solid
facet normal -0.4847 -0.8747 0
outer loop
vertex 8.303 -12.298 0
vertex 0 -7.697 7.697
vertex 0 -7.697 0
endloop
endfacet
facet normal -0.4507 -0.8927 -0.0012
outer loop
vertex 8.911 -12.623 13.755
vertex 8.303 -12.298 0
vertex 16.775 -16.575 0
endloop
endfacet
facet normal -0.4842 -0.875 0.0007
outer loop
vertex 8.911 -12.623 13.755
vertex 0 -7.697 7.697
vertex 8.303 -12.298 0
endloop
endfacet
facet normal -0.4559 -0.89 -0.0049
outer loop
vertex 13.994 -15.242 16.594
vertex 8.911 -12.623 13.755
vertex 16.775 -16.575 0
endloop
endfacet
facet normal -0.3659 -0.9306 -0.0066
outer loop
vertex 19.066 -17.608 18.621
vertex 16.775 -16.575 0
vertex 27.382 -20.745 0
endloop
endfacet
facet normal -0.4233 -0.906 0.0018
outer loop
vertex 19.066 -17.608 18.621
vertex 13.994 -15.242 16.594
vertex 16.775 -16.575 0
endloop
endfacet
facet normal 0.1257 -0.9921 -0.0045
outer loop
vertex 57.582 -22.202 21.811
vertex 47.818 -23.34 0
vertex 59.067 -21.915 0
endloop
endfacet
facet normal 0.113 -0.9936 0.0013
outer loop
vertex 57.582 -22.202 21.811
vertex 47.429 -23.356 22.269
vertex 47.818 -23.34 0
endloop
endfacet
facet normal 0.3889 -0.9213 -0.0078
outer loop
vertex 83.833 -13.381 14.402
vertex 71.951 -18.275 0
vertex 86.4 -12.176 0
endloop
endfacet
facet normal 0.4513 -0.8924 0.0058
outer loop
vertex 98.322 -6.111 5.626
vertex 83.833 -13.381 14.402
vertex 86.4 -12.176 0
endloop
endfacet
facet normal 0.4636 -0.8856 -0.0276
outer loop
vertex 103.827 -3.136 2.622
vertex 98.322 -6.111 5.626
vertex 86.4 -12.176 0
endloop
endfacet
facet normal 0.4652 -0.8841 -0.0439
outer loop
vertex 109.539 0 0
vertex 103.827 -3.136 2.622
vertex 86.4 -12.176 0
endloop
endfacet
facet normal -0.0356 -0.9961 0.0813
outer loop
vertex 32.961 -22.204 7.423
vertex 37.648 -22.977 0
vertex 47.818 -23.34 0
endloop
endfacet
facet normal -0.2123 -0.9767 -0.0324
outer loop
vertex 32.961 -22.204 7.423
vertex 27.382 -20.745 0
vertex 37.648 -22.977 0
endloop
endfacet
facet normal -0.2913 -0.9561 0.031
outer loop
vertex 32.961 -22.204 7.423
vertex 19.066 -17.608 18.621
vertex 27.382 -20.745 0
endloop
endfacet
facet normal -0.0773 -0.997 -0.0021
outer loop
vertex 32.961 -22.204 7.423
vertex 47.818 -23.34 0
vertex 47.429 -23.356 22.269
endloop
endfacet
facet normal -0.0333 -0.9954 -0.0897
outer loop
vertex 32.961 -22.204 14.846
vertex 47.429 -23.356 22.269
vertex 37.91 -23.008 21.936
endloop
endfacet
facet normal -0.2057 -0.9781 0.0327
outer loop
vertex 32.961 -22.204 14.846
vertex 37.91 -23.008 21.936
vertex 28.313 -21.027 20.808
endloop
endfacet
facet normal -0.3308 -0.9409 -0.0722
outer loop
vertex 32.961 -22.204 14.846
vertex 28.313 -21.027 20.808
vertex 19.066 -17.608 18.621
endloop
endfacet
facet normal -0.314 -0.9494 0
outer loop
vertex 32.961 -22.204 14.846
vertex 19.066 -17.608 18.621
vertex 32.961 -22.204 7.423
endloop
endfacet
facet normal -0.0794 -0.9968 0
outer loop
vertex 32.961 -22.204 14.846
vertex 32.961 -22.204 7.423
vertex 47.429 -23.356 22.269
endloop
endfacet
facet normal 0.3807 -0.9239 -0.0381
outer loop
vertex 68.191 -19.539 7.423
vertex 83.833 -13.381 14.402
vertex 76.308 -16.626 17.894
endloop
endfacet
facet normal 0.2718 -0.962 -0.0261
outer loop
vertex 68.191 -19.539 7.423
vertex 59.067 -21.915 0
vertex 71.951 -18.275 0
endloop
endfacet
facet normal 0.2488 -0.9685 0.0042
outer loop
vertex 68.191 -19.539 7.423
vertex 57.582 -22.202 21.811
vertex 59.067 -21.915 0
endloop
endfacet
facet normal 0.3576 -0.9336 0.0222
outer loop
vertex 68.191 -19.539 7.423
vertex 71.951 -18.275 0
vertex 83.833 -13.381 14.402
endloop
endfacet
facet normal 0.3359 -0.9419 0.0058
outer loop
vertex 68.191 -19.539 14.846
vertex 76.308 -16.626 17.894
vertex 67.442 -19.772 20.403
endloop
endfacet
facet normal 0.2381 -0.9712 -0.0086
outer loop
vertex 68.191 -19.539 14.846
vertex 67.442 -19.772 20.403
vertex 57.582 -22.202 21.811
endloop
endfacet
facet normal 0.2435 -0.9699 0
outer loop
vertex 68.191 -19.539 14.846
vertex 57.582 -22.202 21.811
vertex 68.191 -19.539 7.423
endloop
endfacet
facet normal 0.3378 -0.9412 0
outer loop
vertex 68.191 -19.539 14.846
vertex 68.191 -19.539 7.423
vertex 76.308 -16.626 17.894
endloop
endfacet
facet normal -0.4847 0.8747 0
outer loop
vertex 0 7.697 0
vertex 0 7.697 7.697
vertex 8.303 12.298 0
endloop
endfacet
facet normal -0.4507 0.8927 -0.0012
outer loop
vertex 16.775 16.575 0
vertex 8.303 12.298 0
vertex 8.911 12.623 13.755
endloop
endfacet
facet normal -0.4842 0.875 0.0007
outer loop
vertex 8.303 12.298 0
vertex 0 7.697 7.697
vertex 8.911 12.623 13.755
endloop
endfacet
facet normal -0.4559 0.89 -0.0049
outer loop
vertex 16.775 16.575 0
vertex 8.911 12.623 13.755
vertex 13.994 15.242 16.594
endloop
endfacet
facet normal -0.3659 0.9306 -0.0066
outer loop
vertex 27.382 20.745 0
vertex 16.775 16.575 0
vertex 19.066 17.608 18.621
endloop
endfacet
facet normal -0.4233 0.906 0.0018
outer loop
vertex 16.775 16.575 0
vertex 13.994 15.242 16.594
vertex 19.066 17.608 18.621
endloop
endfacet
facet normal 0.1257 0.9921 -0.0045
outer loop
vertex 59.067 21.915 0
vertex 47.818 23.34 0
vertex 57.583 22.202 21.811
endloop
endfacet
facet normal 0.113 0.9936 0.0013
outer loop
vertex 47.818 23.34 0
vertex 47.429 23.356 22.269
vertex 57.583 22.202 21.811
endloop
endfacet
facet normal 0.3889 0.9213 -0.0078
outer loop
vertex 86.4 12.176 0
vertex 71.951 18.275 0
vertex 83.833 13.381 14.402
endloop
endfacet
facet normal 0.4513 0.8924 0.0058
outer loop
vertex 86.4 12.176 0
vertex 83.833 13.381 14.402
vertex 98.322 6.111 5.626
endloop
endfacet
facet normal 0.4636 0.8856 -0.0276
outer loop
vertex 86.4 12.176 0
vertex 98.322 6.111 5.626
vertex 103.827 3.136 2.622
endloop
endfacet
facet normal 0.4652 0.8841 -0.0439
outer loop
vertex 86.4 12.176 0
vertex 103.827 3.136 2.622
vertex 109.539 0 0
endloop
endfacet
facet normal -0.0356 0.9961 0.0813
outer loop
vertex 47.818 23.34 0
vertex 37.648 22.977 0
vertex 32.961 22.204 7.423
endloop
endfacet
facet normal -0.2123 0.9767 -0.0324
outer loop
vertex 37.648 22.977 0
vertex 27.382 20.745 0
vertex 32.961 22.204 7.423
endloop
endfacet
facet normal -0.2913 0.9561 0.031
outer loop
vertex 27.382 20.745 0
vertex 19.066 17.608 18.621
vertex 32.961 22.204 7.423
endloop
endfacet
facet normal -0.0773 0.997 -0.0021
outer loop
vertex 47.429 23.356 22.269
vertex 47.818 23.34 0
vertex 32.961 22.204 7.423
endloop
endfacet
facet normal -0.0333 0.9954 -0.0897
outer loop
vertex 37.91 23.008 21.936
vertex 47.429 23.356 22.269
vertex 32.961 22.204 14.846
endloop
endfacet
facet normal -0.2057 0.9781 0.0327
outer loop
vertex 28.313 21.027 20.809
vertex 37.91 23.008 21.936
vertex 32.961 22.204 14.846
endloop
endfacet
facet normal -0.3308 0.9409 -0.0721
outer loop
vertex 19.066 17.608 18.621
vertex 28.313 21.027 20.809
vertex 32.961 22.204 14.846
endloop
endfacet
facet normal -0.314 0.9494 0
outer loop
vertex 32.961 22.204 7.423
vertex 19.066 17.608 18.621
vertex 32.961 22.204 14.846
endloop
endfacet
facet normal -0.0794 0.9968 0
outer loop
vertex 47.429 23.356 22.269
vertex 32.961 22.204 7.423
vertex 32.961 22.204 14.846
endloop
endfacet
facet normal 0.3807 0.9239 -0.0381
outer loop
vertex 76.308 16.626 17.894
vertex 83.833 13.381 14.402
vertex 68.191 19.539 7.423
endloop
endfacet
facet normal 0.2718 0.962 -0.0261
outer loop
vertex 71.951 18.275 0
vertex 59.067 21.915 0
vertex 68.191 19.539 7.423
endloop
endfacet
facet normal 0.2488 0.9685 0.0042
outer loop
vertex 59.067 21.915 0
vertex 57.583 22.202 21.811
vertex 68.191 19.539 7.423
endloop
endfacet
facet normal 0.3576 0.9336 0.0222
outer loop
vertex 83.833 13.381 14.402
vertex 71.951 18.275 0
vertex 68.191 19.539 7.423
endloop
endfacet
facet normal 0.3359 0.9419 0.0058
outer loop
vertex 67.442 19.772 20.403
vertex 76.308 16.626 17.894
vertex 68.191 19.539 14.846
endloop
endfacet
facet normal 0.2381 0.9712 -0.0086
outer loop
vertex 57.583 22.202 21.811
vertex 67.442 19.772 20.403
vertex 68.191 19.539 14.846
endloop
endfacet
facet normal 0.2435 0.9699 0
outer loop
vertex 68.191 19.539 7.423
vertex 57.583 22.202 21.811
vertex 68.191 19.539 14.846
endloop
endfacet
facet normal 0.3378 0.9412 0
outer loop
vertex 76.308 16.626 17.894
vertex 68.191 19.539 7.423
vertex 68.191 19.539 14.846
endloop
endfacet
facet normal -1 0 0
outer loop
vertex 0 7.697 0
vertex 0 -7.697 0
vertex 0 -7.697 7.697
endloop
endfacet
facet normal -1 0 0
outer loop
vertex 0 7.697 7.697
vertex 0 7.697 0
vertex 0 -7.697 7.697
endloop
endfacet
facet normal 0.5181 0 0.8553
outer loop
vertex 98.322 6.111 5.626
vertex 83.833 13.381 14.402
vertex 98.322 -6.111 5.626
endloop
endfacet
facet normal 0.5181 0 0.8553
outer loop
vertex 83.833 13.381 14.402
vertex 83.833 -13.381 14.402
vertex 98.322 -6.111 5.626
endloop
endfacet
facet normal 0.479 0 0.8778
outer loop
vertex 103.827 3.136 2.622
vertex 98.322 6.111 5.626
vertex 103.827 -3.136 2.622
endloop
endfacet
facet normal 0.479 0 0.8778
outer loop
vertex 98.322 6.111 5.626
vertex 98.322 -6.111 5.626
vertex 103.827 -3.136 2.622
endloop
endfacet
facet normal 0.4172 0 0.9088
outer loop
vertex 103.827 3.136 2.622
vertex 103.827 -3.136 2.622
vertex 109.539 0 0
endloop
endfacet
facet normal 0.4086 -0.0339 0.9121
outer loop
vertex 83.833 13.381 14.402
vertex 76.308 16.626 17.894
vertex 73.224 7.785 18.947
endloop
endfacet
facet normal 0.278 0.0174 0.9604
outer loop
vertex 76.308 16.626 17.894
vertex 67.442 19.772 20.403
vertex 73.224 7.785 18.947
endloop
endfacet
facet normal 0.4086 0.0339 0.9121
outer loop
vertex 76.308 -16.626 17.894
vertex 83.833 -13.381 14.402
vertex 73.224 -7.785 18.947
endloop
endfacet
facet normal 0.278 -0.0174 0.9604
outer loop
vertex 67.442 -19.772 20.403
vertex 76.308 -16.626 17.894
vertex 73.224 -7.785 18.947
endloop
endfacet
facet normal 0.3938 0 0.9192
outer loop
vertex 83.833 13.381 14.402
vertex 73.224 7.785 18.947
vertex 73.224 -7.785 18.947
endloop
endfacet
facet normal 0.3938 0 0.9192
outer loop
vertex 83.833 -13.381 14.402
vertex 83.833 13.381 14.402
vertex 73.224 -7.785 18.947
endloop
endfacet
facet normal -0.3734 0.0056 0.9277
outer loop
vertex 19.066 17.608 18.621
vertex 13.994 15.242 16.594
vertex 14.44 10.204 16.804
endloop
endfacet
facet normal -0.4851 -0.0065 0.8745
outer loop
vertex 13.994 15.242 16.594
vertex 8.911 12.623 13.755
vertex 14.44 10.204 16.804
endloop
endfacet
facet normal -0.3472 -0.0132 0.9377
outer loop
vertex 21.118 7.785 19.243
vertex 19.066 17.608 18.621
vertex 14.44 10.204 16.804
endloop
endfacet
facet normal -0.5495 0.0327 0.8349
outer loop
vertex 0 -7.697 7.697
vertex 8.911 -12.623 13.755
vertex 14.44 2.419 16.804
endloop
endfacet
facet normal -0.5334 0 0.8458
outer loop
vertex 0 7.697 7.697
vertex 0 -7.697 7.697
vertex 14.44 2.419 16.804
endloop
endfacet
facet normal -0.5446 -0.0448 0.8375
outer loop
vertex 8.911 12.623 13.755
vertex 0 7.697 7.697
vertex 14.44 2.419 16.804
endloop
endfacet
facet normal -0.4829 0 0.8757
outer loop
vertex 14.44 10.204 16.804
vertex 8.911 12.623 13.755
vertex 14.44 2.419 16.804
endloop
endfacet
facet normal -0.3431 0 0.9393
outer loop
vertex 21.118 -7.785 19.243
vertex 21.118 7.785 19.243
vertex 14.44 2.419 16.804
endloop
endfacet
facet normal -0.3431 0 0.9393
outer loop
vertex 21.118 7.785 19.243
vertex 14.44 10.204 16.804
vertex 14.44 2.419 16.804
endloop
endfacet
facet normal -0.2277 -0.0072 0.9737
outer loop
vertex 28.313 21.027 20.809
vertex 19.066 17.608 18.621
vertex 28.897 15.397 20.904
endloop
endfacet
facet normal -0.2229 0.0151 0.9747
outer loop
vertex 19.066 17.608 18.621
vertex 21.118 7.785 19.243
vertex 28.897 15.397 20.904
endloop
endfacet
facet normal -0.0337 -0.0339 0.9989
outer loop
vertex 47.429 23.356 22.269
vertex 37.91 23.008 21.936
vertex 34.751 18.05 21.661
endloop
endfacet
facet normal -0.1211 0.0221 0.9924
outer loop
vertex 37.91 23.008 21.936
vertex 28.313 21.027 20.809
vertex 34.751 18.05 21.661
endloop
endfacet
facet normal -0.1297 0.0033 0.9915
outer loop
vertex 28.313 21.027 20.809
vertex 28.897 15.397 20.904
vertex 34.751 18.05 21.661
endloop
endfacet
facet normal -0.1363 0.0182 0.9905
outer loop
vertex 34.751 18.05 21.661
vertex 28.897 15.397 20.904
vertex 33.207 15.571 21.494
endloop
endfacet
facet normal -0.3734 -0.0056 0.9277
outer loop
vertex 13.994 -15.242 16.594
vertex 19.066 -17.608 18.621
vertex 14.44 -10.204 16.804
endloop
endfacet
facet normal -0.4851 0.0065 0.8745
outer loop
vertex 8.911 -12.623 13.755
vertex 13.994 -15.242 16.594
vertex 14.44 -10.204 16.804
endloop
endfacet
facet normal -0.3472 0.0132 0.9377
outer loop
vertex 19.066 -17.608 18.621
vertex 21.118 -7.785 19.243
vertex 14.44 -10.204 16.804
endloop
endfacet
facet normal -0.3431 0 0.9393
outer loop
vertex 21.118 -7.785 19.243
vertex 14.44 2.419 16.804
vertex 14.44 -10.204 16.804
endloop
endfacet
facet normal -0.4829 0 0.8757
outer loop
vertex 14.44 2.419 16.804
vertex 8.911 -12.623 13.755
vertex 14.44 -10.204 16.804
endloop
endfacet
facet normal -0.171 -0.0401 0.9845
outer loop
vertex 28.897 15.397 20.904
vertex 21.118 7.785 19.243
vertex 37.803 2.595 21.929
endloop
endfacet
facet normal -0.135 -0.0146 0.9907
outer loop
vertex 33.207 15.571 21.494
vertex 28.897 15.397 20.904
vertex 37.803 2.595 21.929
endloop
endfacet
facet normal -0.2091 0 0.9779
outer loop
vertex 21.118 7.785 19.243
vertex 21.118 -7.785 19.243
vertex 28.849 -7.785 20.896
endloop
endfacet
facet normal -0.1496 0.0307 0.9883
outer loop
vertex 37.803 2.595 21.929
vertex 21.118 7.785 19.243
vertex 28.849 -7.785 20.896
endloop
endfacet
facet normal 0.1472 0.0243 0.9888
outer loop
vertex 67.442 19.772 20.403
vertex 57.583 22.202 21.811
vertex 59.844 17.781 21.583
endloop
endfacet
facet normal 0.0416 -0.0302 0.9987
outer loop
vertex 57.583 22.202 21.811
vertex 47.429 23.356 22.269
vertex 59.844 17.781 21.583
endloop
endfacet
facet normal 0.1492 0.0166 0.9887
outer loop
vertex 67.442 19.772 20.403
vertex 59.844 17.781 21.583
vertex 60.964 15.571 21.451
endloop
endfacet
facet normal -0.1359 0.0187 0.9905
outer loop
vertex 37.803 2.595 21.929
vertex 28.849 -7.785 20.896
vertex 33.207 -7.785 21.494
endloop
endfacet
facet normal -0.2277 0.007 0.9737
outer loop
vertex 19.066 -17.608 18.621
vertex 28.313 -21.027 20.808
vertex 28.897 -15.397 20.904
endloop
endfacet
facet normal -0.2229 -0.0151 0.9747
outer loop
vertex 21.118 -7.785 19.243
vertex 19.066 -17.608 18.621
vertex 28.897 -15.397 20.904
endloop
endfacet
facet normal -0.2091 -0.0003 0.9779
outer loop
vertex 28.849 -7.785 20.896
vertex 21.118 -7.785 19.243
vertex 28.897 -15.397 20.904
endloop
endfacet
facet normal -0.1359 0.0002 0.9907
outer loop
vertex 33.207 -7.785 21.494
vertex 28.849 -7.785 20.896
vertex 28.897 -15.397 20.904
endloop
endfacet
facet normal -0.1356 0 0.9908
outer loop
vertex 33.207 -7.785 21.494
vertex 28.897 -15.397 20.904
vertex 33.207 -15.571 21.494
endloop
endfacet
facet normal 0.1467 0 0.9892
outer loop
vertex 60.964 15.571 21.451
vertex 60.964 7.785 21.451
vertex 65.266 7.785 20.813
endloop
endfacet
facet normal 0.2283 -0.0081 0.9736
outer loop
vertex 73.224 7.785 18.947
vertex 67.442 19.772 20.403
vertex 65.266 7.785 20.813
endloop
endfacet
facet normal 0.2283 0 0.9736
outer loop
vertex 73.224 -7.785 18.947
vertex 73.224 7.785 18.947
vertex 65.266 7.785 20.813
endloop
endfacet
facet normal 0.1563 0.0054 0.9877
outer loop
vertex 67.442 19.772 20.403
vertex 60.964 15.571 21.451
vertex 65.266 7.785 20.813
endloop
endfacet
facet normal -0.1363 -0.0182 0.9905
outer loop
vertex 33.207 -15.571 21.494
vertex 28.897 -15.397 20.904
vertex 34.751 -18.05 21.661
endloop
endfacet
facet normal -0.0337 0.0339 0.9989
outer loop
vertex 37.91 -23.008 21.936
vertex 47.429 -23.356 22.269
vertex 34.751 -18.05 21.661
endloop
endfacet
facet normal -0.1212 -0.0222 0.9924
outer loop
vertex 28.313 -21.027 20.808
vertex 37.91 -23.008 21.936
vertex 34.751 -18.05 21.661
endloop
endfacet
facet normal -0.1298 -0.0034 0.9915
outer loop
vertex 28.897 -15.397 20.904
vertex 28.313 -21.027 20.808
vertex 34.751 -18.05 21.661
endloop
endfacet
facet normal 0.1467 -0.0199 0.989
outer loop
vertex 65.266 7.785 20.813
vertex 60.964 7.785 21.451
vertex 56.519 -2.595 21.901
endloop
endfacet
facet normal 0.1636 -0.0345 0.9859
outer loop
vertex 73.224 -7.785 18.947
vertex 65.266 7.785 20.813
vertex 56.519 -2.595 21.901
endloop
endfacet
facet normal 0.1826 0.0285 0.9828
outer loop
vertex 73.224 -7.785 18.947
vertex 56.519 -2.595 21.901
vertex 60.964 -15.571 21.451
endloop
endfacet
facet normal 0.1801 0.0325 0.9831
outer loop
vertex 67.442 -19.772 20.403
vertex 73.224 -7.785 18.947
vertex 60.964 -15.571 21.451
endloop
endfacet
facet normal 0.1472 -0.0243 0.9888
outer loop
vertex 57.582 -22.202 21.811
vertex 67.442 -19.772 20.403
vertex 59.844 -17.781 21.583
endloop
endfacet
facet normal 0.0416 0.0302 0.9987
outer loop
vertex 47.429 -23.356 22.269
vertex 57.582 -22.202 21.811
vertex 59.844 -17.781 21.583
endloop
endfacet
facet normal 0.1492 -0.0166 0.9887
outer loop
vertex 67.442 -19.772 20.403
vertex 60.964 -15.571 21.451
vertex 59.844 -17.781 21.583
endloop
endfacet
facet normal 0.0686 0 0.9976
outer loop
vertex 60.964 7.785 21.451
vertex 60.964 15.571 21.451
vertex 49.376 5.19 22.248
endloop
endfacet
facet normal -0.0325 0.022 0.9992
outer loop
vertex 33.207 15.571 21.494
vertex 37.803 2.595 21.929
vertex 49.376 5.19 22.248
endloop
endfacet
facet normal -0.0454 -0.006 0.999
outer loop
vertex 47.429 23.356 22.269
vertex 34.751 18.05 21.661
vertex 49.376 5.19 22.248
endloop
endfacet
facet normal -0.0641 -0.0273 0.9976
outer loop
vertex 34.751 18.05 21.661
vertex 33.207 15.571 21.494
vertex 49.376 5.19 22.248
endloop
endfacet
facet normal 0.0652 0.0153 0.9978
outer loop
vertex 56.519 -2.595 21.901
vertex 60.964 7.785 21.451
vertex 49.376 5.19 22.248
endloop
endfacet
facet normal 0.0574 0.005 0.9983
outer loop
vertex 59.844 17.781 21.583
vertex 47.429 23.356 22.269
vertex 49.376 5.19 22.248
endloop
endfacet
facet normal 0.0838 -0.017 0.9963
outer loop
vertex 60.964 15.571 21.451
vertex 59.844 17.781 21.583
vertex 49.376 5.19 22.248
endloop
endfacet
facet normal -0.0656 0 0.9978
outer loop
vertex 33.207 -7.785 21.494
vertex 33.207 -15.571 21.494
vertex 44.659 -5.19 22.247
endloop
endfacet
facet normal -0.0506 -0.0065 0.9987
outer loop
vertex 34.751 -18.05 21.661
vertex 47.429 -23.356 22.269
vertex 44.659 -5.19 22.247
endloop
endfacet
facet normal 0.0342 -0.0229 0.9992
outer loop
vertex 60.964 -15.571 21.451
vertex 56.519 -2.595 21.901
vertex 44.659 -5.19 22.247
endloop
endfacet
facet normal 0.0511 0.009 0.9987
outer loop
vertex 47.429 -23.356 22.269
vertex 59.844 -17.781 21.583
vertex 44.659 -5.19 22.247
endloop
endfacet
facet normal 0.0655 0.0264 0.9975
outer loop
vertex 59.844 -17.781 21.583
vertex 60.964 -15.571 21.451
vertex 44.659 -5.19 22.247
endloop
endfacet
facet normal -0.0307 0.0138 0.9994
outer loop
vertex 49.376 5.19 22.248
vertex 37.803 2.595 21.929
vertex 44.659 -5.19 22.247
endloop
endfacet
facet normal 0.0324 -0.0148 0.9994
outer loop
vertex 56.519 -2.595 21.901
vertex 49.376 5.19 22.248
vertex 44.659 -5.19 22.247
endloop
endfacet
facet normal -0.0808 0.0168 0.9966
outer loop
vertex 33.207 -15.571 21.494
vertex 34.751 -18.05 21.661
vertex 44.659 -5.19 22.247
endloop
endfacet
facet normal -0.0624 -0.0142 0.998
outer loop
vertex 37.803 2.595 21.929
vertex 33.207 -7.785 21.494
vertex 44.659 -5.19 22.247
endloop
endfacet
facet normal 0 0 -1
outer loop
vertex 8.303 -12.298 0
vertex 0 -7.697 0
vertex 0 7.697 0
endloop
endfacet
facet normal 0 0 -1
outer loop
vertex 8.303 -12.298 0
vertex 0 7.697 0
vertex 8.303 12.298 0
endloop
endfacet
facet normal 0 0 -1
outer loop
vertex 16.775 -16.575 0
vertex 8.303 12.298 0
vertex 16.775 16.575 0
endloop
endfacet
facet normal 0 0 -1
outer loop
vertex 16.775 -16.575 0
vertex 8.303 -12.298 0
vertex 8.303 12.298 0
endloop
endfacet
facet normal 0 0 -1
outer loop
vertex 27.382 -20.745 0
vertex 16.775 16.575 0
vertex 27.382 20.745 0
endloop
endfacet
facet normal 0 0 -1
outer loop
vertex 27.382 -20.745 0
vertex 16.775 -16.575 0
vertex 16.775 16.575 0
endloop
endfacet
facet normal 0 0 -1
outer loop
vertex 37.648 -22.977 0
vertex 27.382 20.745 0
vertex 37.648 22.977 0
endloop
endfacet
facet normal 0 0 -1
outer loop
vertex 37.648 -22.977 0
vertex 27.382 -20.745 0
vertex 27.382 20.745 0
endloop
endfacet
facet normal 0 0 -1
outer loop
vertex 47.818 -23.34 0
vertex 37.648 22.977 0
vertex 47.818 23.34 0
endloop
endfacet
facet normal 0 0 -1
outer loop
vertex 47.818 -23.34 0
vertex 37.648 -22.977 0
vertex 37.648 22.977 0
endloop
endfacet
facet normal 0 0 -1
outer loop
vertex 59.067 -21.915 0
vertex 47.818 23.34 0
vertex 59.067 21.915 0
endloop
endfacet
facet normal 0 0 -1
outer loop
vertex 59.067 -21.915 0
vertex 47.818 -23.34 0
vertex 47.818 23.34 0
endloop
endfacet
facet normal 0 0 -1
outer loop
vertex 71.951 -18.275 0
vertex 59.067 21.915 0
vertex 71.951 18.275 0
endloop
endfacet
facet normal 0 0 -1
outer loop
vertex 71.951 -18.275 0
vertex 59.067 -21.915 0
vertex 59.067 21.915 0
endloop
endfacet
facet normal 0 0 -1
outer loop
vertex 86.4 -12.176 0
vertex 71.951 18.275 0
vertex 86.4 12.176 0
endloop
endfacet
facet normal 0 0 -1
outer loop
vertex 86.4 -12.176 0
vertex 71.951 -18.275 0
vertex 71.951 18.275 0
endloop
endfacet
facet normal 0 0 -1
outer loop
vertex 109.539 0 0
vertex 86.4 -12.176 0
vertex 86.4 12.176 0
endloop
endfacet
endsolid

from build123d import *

# Parameters (mm, degrees)
F0_W          = 109.5394790173
F0_H          = 28.1250011176
F1_DEPTH      = 35
F1_DEPTH_BACK = 35
F5_DEPTH      = 31
F6_DEPTH      = 100


with BuildPart() as f1:
    # F0 (on Front) → F1 (new body, two sides)
    with BuildSketch(Plane.XZ) as f1_sk:
        with Locations((54.7697395086, 14.0625005588)):
            Rectangle(F0_W, F0_H)
    extrude(amount=F1_DEPTH)
    extrude(f1_sk.sketch, amount=-F1_DEPTH_BACK)

    # F3 (on face) → F5 (intersect)
    with BuildSketch(Plane.XY.offset(28.1250011176)):
        with BuildLine():
            add(Edge.make_bspline(
                [(0, 7.6973685063), (10.7783876284, 13.7571428571), (32.2328018982, 25.8191426464), (69.7141381245, 21.9197675934), (95.7061758288, 7.6138153282), (109.5394790173, 0)],
                knots=[0, 0, 0, 0, 0.3207776819, 0.6385089786, 1, 1, 1, 1], degree=3))
            Line((0, 7.6973685063), (0, 0))
            Line((0, 0), (109.5394790173, 0))
        make_face()
        with BuildLine():
            add(Edge.make_bspline(
                [(0, -7.6973685063), (10.7783876284, -13.7571428571), (32.2328018982, -25.8191426464), (69.7141381245, -21.9197675934), (95.7061758288, -7.6138153282), (109.5394790173, 0)],
                knots=[0, 0, 0, 0, 0.3207776819, 0.6385089786, 1, 1, 1, 1], degree=3))
            Line((109.5394790173, 0), (0, 0))
            Line((0, 0), (0, -7.6973685063))
        make_face()
    extrude(amount=-F5_DEPTH, mode=Mode.INTERSECT)

    # F4 (on face) → F6 (intersect)
    with BuildSketch(Plane.XZ.offset(35)):
        with BuildLine():
            add(Edge.make_bspline(
                [(0, 7.6973685063), (7.5000007637, 12.7302631736), (18.652984131, 22.5336262328), (78.5500374125, 24.2570244507), (94.2074585817, 6.353942989), (109.5394790173, 0)],
                knots=[0, 0, 0, 0, 0.2648366639, 0.6545064133, 1, 1, 1, 1], degree=3))
            Line((0, 7.6973685063), (0, 0))
            Line((0, 0), (109.5394790173, 0))
        make_face()
    extrude(amount=-F6_DEPTH, mode=Mode.INTERSECT)


solid = f1.part
